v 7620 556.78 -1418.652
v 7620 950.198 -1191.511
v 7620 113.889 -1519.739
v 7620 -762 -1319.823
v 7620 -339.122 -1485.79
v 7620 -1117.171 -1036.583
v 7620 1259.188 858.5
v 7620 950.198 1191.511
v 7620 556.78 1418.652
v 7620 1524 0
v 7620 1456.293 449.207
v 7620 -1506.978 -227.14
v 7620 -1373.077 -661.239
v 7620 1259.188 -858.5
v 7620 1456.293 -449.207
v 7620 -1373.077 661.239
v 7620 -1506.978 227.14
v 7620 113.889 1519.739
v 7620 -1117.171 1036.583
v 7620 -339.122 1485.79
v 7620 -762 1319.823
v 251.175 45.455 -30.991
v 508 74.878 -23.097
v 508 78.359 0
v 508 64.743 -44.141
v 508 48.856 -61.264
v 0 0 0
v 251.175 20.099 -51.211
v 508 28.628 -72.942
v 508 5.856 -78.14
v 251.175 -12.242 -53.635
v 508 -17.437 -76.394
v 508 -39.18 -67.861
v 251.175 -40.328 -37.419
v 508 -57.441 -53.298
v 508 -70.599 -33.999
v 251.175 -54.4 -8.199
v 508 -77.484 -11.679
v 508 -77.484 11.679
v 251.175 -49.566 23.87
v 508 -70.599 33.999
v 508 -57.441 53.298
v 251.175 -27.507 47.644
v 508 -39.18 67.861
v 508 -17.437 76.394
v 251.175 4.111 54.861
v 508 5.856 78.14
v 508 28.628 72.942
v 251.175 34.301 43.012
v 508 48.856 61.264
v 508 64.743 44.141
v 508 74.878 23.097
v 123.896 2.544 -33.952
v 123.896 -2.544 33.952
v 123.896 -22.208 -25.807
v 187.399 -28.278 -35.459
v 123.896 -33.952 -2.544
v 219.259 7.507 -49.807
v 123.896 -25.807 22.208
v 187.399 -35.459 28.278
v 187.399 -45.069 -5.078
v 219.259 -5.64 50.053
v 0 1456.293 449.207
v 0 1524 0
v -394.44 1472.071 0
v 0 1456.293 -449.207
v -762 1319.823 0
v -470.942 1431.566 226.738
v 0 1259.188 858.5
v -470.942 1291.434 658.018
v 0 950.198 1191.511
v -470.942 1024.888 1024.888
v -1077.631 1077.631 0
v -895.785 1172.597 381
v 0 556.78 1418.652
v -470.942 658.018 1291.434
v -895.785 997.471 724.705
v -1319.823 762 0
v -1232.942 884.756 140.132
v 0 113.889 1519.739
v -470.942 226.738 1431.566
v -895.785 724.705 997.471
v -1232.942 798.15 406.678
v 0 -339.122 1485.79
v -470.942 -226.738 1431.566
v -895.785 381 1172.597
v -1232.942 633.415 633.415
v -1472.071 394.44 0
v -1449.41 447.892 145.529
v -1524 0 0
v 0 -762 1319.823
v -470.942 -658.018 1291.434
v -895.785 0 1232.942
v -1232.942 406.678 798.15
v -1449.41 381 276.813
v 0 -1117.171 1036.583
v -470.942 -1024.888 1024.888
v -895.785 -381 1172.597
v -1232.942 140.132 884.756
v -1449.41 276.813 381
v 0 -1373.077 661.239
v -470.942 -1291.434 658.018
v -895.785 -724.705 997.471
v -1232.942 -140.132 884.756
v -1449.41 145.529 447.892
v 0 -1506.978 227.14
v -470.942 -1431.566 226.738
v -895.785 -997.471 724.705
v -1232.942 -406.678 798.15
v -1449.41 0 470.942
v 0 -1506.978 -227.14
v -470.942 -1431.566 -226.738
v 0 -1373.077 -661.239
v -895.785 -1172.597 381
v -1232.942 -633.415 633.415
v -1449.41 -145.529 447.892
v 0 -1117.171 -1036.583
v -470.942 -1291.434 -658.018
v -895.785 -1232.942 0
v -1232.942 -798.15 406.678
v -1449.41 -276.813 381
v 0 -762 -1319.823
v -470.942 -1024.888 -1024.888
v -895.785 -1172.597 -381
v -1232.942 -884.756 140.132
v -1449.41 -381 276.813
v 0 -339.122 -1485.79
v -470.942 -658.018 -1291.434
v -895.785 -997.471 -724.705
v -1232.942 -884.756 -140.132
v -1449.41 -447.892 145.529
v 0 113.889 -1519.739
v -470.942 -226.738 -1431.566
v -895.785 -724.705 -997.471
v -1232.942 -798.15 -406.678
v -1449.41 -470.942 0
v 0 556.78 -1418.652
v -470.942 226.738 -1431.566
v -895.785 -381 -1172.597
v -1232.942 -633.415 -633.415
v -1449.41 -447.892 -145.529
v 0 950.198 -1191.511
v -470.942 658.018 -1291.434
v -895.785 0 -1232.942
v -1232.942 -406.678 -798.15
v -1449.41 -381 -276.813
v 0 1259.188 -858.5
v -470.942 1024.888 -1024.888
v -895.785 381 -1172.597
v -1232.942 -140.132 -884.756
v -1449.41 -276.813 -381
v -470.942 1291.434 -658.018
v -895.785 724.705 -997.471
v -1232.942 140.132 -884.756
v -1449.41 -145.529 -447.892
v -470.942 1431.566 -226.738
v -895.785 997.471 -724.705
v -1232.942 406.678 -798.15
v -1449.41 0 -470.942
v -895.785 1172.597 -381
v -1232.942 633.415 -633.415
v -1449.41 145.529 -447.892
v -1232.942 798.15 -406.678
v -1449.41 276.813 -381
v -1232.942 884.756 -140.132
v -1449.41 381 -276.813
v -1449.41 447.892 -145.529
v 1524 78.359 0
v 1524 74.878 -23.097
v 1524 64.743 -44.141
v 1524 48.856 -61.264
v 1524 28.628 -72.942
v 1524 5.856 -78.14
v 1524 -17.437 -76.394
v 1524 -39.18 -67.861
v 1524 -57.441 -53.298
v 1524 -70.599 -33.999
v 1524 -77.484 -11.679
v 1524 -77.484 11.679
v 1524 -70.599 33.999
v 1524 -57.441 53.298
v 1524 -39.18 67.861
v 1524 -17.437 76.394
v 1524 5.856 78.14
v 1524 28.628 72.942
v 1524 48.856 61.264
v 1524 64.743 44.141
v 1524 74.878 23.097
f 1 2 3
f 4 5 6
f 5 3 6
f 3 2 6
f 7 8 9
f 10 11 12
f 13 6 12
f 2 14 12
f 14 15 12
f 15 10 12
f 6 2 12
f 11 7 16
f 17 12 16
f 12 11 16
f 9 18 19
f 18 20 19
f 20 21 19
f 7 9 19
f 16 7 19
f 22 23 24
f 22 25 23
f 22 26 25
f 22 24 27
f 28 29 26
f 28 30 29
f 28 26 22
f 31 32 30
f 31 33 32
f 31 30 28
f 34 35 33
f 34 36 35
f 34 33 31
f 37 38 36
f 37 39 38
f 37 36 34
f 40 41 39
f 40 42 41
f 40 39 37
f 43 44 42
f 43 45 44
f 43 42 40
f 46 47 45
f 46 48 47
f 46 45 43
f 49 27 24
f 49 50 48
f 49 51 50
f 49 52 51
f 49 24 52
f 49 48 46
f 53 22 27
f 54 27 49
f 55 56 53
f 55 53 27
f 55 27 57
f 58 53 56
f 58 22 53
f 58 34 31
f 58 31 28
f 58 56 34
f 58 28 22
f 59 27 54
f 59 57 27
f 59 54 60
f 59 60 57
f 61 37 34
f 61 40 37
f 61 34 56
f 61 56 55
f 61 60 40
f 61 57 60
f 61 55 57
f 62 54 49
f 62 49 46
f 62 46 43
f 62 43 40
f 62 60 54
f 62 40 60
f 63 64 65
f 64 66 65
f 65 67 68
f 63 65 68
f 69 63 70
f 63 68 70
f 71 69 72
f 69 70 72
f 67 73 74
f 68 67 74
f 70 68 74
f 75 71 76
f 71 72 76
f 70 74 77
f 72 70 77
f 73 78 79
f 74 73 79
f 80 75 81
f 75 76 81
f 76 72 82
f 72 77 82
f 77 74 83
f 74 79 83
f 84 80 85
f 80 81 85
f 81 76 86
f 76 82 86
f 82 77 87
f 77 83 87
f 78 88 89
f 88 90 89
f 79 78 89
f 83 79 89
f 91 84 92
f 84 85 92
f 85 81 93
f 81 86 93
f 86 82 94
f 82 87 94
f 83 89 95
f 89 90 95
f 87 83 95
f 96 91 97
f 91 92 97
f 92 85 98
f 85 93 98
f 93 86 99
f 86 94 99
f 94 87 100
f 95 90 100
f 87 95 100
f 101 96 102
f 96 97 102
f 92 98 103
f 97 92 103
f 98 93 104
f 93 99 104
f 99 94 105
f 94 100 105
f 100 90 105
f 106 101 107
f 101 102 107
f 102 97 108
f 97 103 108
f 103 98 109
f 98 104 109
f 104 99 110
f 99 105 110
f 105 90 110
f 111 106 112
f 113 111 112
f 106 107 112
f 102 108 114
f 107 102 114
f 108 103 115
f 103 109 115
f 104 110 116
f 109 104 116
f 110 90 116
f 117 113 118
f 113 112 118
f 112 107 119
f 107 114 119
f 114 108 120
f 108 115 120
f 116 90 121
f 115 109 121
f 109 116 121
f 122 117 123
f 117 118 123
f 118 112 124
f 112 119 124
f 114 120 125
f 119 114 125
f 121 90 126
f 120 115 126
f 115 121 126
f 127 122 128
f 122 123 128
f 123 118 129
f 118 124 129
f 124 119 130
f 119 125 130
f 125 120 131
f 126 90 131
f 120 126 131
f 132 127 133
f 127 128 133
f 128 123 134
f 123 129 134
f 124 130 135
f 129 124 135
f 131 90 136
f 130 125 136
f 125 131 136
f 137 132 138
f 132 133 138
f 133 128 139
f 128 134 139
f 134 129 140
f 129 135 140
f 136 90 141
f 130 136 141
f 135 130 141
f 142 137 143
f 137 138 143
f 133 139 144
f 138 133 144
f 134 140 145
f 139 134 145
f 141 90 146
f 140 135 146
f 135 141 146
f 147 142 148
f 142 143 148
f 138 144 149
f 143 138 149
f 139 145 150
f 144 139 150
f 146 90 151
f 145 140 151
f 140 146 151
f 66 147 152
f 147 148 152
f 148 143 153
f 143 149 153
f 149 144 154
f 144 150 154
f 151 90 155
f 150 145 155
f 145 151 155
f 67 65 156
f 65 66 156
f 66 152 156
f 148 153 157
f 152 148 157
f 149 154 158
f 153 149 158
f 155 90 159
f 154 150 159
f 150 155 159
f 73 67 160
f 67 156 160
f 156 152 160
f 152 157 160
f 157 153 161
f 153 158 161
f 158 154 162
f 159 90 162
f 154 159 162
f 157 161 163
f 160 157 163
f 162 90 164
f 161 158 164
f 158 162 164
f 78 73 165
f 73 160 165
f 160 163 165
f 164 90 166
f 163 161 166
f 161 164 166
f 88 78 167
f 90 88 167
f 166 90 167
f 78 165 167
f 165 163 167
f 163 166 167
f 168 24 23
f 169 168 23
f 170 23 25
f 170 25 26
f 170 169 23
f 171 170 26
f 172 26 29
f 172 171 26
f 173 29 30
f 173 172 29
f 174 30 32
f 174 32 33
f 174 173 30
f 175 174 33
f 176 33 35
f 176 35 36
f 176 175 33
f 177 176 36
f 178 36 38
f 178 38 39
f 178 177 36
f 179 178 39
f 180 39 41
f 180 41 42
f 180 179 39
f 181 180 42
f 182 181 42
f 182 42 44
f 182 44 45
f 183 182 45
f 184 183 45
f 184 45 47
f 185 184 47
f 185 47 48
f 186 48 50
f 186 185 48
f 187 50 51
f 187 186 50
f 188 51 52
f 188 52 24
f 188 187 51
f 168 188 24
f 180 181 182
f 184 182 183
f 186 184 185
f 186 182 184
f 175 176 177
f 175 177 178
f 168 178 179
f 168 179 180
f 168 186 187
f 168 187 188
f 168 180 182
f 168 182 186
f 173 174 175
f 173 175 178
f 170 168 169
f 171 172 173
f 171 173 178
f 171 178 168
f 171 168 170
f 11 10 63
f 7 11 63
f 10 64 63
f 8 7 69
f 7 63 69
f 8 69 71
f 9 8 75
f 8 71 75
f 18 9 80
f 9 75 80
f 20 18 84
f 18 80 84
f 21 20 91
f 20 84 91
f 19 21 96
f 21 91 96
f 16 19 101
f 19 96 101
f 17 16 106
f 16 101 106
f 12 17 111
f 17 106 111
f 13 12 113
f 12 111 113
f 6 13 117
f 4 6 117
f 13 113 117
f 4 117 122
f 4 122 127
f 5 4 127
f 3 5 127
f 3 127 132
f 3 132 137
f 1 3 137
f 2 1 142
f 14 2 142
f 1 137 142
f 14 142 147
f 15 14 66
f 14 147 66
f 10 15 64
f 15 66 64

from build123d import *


with BuildPart() as part:
    # Sketch8 → Revolve8 (revolve)
    with BuildSketch(Plane.XY):
        with BuildLine():
            Line((508, 0), (0, 0))
            add(Edge.make_bspline(
                [(0, 0), (0.002822011, 0.011220682), (0.01010376, 0.033028979), (0.031502321, 0.074017024), (0.069784833, 0.131646678), (0.119222388, 0.195375451), (0.189812425, 0.276067496), (0.274835356, 0.363880791), (0.401947452, 0.484306453), (0.602624186, 0.656685654), (0.914446886, 0.898448081), (1.444794417, 1.267055392), (2.342189308, 1.821854316), (3.926219982, 2.68636524), (6.792153336, 4.05339861), (11.891147147, 6.162529219), (20.431057711, 9.216107653), (31.891623295, 12.776951203), (45.625686568, 16.59500746), (64.715206078, 21.439103902), (87.842839522, 26.755548696), (115.260857413, 32.475768916), (146.98211669, 38.485522007), (178.789638074, 44.017933119), (210.666331669, 49.135593448), (242.60094075, 53.877496918), (274.585932559, 58.26635678), (306.615943821, 62.313330004), (338.687218842, 66.019317565), (370.797101622, 69.374815155), (402.943853119, 72.357821551), (431.103668314, 74.606208089), (455.262955994, 76.229190957), (474.443672775, 77.278006717), (487.103143355, 77.83586579), (497.267203511, 78.174386426), (503.399758723, 78.310011701), (506.466506539, 78.353386553), (508, 78.359)],
                knots=[0, 0, 0, 0, 0, 8.9262e-05, 0.000178524, 0.000357048, 0.000535573, 0.000714097, 0.001009141, 0.001304186, 0.001892408, 0.002763912, 0.00406622, 0.006308364, 0.010066681, 0.016745451, 0.028667746, 0.049062689, 0.080343506, 0.109747473, 0.13915144, 0.201713099, 0.264274768, 0.326836438, 0.389398105, 0.451959776, 0.514521446, 0.577083113, 0.639644785, 0.702206453, 0.764768123, 0.827329793, 0.889891462, 0.921172297, 0.952453131, 0.976226566, 0.988113283, 1, 1, 1, 1, 1], degree=4))
            Line((508, 78.359), (762, 78.359))
            Line((762, 78.359), (1524, 78.359))
            Line((1524, 78.359), (1524, 0))
            Line((1524, 0), (762, 0))
            Line((762, 0), (508, 0))
        make_face()
    revolve(axis=Axis((508, 0, 0), (-1, 0, 0)))


with BuildPart() as body_2:
    # Sketch9 → Revolve9 (revolve)
    with BuildSketch(Plane.XY):
        with BuildLine():
            Line((-1524, 0), (7620.000077199, 0))
            Line((7620.000077199, 0), (7620.000077199, 1524))
            Line((7620.000077199, 1524), (7.7199e-05, 1524))
            ThreePointArc((7.7199e-05, 1524), (-1077.630707234, 1077.630761822), (-1524, 0))
        make_face()
    revolve(axis=Axis((-1524, 0, 0), (1, 0, 0)))

    # Combine1: cut part
    add(part.part, mode=Mode.SUBTRACT)


solid = body_2.part
